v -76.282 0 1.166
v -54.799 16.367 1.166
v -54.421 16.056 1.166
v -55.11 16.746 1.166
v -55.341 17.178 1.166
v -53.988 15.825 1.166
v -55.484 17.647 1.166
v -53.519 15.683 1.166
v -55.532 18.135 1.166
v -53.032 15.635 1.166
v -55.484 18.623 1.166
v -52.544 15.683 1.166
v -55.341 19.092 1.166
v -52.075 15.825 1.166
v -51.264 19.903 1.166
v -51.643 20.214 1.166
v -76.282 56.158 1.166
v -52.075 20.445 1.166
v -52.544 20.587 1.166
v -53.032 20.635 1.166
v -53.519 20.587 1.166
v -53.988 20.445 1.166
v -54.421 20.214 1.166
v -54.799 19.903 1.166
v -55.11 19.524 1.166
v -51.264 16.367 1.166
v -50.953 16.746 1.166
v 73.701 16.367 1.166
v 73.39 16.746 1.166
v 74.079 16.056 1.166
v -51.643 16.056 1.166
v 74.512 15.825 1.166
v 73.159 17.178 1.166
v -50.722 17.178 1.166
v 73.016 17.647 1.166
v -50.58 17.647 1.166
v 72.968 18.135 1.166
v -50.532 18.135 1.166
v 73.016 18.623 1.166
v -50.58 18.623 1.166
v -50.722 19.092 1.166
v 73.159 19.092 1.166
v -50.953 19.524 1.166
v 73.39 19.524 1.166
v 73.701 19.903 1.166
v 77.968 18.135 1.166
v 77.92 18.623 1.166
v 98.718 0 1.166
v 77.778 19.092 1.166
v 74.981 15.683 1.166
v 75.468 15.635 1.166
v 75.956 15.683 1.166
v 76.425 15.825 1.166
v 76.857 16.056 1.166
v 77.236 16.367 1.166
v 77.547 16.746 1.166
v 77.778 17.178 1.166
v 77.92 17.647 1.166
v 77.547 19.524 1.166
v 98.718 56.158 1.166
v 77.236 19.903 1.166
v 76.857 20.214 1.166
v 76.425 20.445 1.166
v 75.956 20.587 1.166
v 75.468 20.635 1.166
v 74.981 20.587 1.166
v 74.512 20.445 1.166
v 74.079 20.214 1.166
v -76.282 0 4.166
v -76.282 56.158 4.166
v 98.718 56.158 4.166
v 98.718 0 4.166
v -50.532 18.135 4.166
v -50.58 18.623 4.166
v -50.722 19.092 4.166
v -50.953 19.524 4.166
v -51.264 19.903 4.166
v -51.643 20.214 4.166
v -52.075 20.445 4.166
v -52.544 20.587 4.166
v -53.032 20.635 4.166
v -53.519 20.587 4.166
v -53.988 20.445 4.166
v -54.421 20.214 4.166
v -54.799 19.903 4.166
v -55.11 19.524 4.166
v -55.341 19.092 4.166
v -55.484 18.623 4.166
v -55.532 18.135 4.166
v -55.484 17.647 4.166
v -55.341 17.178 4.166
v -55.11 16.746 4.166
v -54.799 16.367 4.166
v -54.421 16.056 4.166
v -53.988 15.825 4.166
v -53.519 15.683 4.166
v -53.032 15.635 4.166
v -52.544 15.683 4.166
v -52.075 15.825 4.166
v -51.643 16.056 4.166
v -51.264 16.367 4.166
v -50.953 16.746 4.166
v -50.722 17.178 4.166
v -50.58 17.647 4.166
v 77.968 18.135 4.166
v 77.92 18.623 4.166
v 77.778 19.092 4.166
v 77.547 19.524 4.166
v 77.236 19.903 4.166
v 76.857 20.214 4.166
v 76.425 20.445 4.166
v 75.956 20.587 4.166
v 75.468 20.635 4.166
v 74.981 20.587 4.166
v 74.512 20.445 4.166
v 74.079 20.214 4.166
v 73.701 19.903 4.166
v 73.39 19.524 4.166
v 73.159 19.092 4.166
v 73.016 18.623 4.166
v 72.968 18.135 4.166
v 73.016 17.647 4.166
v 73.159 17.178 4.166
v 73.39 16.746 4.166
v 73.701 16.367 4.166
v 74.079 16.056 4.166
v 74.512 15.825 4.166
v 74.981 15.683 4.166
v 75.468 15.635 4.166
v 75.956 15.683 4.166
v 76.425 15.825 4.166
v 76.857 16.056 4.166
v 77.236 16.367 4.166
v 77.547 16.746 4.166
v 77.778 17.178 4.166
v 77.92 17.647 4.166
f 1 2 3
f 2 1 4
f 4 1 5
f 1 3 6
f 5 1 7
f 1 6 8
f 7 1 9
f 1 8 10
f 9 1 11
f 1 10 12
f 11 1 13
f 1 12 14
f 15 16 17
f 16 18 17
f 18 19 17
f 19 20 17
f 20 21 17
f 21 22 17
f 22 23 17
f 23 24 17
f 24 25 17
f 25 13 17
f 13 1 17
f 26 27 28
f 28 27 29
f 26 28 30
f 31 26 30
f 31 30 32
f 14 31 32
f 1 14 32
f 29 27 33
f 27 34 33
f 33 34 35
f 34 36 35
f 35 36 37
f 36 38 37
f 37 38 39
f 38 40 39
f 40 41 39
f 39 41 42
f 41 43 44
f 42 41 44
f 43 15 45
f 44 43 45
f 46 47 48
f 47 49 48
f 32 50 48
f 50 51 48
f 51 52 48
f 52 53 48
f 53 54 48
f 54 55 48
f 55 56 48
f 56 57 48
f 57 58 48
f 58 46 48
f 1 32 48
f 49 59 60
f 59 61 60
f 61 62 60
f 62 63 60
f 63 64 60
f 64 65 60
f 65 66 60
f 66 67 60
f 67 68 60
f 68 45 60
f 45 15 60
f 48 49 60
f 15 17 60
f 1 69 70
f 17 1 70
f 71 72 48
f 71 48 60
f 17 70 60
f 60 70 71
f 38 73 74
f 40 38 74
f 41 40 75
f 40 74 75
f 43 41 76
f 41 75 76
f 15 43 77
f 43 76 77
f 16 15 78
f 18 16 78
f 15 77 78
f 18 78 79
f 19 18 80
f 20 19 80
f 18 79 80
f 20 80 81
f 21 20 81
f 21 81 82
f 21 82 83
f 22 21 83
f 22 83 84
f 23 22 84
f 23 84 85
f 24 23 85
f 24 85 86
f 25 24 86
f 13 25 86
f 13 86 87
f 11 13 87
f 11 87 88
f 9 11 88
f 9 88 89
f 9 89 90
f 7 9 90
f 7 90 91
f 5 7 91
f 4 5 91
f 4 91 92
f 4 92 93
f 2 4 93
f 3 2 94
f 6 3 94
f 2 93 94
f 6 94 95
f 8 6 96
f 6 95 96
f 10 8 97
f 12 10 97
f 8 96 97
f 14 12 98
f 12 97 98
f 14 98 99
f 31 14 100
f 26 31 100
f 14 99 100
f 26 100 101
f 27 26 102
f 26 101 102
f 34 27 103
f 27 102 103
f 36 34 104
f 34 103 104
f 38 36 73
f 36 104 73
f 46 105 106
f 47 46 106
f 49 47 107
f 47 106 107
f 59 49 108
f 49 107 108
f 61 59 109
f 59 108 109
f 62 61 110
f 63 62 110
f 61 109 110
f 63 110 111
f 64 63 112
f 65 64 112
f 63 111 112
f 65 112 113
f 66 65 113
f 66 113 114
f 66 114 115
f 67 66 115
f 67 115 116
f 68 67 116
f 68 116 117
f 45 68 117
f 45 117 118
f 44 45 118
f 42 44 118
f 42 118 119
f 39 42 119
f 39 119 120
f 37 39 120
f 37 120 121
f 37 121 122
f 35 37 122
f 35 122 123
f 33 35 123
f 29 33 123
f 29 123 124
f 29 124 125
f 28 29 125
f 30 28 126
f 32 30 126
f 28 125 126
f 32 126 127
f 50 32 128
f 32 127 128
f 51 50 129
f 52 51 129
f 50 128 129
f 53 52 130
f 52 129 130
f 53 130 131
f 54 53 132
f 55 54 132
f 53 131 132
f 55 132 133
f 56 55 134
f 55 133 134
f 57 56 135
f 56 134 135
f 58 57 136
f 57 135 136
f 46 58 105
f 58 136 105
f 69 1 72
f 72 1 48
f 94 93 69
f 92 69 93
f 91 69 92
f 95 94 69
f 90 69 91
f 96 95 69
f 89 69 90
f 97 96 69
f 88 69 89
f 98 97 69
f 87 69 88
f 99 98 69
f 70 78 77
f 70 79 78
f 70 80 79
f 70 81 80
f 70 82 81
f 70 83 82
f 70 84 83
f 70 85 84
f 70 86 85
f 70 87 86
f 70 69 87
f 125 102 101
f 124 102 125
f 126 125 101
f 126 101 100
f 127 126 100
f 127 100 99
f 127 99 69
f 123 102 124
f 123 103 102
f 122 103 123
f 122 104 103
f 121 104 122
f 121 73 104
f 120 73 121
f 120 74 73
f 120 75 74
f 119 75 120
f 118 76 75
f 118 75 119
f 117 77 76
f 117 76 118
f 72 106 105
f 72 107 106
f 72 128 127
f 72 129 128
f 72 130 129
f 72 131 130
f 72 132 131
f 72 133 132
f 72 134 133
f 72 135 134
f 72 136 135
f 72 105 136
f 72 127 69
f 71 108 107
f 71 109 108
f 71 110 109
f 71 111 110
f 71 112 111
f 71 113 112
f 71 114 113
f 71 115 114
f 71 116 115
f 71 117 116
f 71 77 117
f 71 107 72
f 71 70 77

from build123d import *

# Parameters (mm, degrees)
ESQUISSE2_W             = 175
ESQUISSE2_H             = 3
BOSS_EXTRU_1_DEPTH      = 36.27
ESQUISSE3_R             = 2.5
ENL_V_MAT_EXTRU_1_DEPTH = 106.213182302
SKETCH1_W               = 175
SKETCH1_H               = 19.88750008
BOSS_EXTRUDE1_DEPTH     = 3


with BuildPart() as part:
    # Esquisse2 → Boss.-Extru.1 (new body)
    with BuildSketch(Plane(origin=(0, 0, 0), x_dir=(1, 0, 0), z_dir=(0, 1, 0))):
        with Locations((11.218290251, -2.666038947)):
            Rectangle(ESQUISSE2_W, ESQUISSE2_H)
    extrude(amount=BOSS_EXTRU_1_DEPTH)

    # Esquisse3 → Enlèv. mat.-Extru.1 (cut, through all)
    with BuildSketch(Plane.XY.offset(4.166038947)):
        with Locations((-53.031709749, 18.135)):
            Circle(ESQUISSE3_R)
        with Locations((75.468290251, 18.135)):
            Circle(ESQUISSE3_R)
    extrude(amount=-ENL_V_MAT_EXTRU_1_DEPTH, mode=Mode.SUBTRACT)

    # Sketch1 → Boss-Extrude1 (add)
    with BuildSketch(Plane.XY.offset(4.166038947)):
        with Locations((11.218290251, 46.21375004)):
            Rectangle(SKETCH1_W, SKETCH1_H)
    extrude(amount=-BOSS_EXTRUDE1_DEPTH)


solid = part.part
